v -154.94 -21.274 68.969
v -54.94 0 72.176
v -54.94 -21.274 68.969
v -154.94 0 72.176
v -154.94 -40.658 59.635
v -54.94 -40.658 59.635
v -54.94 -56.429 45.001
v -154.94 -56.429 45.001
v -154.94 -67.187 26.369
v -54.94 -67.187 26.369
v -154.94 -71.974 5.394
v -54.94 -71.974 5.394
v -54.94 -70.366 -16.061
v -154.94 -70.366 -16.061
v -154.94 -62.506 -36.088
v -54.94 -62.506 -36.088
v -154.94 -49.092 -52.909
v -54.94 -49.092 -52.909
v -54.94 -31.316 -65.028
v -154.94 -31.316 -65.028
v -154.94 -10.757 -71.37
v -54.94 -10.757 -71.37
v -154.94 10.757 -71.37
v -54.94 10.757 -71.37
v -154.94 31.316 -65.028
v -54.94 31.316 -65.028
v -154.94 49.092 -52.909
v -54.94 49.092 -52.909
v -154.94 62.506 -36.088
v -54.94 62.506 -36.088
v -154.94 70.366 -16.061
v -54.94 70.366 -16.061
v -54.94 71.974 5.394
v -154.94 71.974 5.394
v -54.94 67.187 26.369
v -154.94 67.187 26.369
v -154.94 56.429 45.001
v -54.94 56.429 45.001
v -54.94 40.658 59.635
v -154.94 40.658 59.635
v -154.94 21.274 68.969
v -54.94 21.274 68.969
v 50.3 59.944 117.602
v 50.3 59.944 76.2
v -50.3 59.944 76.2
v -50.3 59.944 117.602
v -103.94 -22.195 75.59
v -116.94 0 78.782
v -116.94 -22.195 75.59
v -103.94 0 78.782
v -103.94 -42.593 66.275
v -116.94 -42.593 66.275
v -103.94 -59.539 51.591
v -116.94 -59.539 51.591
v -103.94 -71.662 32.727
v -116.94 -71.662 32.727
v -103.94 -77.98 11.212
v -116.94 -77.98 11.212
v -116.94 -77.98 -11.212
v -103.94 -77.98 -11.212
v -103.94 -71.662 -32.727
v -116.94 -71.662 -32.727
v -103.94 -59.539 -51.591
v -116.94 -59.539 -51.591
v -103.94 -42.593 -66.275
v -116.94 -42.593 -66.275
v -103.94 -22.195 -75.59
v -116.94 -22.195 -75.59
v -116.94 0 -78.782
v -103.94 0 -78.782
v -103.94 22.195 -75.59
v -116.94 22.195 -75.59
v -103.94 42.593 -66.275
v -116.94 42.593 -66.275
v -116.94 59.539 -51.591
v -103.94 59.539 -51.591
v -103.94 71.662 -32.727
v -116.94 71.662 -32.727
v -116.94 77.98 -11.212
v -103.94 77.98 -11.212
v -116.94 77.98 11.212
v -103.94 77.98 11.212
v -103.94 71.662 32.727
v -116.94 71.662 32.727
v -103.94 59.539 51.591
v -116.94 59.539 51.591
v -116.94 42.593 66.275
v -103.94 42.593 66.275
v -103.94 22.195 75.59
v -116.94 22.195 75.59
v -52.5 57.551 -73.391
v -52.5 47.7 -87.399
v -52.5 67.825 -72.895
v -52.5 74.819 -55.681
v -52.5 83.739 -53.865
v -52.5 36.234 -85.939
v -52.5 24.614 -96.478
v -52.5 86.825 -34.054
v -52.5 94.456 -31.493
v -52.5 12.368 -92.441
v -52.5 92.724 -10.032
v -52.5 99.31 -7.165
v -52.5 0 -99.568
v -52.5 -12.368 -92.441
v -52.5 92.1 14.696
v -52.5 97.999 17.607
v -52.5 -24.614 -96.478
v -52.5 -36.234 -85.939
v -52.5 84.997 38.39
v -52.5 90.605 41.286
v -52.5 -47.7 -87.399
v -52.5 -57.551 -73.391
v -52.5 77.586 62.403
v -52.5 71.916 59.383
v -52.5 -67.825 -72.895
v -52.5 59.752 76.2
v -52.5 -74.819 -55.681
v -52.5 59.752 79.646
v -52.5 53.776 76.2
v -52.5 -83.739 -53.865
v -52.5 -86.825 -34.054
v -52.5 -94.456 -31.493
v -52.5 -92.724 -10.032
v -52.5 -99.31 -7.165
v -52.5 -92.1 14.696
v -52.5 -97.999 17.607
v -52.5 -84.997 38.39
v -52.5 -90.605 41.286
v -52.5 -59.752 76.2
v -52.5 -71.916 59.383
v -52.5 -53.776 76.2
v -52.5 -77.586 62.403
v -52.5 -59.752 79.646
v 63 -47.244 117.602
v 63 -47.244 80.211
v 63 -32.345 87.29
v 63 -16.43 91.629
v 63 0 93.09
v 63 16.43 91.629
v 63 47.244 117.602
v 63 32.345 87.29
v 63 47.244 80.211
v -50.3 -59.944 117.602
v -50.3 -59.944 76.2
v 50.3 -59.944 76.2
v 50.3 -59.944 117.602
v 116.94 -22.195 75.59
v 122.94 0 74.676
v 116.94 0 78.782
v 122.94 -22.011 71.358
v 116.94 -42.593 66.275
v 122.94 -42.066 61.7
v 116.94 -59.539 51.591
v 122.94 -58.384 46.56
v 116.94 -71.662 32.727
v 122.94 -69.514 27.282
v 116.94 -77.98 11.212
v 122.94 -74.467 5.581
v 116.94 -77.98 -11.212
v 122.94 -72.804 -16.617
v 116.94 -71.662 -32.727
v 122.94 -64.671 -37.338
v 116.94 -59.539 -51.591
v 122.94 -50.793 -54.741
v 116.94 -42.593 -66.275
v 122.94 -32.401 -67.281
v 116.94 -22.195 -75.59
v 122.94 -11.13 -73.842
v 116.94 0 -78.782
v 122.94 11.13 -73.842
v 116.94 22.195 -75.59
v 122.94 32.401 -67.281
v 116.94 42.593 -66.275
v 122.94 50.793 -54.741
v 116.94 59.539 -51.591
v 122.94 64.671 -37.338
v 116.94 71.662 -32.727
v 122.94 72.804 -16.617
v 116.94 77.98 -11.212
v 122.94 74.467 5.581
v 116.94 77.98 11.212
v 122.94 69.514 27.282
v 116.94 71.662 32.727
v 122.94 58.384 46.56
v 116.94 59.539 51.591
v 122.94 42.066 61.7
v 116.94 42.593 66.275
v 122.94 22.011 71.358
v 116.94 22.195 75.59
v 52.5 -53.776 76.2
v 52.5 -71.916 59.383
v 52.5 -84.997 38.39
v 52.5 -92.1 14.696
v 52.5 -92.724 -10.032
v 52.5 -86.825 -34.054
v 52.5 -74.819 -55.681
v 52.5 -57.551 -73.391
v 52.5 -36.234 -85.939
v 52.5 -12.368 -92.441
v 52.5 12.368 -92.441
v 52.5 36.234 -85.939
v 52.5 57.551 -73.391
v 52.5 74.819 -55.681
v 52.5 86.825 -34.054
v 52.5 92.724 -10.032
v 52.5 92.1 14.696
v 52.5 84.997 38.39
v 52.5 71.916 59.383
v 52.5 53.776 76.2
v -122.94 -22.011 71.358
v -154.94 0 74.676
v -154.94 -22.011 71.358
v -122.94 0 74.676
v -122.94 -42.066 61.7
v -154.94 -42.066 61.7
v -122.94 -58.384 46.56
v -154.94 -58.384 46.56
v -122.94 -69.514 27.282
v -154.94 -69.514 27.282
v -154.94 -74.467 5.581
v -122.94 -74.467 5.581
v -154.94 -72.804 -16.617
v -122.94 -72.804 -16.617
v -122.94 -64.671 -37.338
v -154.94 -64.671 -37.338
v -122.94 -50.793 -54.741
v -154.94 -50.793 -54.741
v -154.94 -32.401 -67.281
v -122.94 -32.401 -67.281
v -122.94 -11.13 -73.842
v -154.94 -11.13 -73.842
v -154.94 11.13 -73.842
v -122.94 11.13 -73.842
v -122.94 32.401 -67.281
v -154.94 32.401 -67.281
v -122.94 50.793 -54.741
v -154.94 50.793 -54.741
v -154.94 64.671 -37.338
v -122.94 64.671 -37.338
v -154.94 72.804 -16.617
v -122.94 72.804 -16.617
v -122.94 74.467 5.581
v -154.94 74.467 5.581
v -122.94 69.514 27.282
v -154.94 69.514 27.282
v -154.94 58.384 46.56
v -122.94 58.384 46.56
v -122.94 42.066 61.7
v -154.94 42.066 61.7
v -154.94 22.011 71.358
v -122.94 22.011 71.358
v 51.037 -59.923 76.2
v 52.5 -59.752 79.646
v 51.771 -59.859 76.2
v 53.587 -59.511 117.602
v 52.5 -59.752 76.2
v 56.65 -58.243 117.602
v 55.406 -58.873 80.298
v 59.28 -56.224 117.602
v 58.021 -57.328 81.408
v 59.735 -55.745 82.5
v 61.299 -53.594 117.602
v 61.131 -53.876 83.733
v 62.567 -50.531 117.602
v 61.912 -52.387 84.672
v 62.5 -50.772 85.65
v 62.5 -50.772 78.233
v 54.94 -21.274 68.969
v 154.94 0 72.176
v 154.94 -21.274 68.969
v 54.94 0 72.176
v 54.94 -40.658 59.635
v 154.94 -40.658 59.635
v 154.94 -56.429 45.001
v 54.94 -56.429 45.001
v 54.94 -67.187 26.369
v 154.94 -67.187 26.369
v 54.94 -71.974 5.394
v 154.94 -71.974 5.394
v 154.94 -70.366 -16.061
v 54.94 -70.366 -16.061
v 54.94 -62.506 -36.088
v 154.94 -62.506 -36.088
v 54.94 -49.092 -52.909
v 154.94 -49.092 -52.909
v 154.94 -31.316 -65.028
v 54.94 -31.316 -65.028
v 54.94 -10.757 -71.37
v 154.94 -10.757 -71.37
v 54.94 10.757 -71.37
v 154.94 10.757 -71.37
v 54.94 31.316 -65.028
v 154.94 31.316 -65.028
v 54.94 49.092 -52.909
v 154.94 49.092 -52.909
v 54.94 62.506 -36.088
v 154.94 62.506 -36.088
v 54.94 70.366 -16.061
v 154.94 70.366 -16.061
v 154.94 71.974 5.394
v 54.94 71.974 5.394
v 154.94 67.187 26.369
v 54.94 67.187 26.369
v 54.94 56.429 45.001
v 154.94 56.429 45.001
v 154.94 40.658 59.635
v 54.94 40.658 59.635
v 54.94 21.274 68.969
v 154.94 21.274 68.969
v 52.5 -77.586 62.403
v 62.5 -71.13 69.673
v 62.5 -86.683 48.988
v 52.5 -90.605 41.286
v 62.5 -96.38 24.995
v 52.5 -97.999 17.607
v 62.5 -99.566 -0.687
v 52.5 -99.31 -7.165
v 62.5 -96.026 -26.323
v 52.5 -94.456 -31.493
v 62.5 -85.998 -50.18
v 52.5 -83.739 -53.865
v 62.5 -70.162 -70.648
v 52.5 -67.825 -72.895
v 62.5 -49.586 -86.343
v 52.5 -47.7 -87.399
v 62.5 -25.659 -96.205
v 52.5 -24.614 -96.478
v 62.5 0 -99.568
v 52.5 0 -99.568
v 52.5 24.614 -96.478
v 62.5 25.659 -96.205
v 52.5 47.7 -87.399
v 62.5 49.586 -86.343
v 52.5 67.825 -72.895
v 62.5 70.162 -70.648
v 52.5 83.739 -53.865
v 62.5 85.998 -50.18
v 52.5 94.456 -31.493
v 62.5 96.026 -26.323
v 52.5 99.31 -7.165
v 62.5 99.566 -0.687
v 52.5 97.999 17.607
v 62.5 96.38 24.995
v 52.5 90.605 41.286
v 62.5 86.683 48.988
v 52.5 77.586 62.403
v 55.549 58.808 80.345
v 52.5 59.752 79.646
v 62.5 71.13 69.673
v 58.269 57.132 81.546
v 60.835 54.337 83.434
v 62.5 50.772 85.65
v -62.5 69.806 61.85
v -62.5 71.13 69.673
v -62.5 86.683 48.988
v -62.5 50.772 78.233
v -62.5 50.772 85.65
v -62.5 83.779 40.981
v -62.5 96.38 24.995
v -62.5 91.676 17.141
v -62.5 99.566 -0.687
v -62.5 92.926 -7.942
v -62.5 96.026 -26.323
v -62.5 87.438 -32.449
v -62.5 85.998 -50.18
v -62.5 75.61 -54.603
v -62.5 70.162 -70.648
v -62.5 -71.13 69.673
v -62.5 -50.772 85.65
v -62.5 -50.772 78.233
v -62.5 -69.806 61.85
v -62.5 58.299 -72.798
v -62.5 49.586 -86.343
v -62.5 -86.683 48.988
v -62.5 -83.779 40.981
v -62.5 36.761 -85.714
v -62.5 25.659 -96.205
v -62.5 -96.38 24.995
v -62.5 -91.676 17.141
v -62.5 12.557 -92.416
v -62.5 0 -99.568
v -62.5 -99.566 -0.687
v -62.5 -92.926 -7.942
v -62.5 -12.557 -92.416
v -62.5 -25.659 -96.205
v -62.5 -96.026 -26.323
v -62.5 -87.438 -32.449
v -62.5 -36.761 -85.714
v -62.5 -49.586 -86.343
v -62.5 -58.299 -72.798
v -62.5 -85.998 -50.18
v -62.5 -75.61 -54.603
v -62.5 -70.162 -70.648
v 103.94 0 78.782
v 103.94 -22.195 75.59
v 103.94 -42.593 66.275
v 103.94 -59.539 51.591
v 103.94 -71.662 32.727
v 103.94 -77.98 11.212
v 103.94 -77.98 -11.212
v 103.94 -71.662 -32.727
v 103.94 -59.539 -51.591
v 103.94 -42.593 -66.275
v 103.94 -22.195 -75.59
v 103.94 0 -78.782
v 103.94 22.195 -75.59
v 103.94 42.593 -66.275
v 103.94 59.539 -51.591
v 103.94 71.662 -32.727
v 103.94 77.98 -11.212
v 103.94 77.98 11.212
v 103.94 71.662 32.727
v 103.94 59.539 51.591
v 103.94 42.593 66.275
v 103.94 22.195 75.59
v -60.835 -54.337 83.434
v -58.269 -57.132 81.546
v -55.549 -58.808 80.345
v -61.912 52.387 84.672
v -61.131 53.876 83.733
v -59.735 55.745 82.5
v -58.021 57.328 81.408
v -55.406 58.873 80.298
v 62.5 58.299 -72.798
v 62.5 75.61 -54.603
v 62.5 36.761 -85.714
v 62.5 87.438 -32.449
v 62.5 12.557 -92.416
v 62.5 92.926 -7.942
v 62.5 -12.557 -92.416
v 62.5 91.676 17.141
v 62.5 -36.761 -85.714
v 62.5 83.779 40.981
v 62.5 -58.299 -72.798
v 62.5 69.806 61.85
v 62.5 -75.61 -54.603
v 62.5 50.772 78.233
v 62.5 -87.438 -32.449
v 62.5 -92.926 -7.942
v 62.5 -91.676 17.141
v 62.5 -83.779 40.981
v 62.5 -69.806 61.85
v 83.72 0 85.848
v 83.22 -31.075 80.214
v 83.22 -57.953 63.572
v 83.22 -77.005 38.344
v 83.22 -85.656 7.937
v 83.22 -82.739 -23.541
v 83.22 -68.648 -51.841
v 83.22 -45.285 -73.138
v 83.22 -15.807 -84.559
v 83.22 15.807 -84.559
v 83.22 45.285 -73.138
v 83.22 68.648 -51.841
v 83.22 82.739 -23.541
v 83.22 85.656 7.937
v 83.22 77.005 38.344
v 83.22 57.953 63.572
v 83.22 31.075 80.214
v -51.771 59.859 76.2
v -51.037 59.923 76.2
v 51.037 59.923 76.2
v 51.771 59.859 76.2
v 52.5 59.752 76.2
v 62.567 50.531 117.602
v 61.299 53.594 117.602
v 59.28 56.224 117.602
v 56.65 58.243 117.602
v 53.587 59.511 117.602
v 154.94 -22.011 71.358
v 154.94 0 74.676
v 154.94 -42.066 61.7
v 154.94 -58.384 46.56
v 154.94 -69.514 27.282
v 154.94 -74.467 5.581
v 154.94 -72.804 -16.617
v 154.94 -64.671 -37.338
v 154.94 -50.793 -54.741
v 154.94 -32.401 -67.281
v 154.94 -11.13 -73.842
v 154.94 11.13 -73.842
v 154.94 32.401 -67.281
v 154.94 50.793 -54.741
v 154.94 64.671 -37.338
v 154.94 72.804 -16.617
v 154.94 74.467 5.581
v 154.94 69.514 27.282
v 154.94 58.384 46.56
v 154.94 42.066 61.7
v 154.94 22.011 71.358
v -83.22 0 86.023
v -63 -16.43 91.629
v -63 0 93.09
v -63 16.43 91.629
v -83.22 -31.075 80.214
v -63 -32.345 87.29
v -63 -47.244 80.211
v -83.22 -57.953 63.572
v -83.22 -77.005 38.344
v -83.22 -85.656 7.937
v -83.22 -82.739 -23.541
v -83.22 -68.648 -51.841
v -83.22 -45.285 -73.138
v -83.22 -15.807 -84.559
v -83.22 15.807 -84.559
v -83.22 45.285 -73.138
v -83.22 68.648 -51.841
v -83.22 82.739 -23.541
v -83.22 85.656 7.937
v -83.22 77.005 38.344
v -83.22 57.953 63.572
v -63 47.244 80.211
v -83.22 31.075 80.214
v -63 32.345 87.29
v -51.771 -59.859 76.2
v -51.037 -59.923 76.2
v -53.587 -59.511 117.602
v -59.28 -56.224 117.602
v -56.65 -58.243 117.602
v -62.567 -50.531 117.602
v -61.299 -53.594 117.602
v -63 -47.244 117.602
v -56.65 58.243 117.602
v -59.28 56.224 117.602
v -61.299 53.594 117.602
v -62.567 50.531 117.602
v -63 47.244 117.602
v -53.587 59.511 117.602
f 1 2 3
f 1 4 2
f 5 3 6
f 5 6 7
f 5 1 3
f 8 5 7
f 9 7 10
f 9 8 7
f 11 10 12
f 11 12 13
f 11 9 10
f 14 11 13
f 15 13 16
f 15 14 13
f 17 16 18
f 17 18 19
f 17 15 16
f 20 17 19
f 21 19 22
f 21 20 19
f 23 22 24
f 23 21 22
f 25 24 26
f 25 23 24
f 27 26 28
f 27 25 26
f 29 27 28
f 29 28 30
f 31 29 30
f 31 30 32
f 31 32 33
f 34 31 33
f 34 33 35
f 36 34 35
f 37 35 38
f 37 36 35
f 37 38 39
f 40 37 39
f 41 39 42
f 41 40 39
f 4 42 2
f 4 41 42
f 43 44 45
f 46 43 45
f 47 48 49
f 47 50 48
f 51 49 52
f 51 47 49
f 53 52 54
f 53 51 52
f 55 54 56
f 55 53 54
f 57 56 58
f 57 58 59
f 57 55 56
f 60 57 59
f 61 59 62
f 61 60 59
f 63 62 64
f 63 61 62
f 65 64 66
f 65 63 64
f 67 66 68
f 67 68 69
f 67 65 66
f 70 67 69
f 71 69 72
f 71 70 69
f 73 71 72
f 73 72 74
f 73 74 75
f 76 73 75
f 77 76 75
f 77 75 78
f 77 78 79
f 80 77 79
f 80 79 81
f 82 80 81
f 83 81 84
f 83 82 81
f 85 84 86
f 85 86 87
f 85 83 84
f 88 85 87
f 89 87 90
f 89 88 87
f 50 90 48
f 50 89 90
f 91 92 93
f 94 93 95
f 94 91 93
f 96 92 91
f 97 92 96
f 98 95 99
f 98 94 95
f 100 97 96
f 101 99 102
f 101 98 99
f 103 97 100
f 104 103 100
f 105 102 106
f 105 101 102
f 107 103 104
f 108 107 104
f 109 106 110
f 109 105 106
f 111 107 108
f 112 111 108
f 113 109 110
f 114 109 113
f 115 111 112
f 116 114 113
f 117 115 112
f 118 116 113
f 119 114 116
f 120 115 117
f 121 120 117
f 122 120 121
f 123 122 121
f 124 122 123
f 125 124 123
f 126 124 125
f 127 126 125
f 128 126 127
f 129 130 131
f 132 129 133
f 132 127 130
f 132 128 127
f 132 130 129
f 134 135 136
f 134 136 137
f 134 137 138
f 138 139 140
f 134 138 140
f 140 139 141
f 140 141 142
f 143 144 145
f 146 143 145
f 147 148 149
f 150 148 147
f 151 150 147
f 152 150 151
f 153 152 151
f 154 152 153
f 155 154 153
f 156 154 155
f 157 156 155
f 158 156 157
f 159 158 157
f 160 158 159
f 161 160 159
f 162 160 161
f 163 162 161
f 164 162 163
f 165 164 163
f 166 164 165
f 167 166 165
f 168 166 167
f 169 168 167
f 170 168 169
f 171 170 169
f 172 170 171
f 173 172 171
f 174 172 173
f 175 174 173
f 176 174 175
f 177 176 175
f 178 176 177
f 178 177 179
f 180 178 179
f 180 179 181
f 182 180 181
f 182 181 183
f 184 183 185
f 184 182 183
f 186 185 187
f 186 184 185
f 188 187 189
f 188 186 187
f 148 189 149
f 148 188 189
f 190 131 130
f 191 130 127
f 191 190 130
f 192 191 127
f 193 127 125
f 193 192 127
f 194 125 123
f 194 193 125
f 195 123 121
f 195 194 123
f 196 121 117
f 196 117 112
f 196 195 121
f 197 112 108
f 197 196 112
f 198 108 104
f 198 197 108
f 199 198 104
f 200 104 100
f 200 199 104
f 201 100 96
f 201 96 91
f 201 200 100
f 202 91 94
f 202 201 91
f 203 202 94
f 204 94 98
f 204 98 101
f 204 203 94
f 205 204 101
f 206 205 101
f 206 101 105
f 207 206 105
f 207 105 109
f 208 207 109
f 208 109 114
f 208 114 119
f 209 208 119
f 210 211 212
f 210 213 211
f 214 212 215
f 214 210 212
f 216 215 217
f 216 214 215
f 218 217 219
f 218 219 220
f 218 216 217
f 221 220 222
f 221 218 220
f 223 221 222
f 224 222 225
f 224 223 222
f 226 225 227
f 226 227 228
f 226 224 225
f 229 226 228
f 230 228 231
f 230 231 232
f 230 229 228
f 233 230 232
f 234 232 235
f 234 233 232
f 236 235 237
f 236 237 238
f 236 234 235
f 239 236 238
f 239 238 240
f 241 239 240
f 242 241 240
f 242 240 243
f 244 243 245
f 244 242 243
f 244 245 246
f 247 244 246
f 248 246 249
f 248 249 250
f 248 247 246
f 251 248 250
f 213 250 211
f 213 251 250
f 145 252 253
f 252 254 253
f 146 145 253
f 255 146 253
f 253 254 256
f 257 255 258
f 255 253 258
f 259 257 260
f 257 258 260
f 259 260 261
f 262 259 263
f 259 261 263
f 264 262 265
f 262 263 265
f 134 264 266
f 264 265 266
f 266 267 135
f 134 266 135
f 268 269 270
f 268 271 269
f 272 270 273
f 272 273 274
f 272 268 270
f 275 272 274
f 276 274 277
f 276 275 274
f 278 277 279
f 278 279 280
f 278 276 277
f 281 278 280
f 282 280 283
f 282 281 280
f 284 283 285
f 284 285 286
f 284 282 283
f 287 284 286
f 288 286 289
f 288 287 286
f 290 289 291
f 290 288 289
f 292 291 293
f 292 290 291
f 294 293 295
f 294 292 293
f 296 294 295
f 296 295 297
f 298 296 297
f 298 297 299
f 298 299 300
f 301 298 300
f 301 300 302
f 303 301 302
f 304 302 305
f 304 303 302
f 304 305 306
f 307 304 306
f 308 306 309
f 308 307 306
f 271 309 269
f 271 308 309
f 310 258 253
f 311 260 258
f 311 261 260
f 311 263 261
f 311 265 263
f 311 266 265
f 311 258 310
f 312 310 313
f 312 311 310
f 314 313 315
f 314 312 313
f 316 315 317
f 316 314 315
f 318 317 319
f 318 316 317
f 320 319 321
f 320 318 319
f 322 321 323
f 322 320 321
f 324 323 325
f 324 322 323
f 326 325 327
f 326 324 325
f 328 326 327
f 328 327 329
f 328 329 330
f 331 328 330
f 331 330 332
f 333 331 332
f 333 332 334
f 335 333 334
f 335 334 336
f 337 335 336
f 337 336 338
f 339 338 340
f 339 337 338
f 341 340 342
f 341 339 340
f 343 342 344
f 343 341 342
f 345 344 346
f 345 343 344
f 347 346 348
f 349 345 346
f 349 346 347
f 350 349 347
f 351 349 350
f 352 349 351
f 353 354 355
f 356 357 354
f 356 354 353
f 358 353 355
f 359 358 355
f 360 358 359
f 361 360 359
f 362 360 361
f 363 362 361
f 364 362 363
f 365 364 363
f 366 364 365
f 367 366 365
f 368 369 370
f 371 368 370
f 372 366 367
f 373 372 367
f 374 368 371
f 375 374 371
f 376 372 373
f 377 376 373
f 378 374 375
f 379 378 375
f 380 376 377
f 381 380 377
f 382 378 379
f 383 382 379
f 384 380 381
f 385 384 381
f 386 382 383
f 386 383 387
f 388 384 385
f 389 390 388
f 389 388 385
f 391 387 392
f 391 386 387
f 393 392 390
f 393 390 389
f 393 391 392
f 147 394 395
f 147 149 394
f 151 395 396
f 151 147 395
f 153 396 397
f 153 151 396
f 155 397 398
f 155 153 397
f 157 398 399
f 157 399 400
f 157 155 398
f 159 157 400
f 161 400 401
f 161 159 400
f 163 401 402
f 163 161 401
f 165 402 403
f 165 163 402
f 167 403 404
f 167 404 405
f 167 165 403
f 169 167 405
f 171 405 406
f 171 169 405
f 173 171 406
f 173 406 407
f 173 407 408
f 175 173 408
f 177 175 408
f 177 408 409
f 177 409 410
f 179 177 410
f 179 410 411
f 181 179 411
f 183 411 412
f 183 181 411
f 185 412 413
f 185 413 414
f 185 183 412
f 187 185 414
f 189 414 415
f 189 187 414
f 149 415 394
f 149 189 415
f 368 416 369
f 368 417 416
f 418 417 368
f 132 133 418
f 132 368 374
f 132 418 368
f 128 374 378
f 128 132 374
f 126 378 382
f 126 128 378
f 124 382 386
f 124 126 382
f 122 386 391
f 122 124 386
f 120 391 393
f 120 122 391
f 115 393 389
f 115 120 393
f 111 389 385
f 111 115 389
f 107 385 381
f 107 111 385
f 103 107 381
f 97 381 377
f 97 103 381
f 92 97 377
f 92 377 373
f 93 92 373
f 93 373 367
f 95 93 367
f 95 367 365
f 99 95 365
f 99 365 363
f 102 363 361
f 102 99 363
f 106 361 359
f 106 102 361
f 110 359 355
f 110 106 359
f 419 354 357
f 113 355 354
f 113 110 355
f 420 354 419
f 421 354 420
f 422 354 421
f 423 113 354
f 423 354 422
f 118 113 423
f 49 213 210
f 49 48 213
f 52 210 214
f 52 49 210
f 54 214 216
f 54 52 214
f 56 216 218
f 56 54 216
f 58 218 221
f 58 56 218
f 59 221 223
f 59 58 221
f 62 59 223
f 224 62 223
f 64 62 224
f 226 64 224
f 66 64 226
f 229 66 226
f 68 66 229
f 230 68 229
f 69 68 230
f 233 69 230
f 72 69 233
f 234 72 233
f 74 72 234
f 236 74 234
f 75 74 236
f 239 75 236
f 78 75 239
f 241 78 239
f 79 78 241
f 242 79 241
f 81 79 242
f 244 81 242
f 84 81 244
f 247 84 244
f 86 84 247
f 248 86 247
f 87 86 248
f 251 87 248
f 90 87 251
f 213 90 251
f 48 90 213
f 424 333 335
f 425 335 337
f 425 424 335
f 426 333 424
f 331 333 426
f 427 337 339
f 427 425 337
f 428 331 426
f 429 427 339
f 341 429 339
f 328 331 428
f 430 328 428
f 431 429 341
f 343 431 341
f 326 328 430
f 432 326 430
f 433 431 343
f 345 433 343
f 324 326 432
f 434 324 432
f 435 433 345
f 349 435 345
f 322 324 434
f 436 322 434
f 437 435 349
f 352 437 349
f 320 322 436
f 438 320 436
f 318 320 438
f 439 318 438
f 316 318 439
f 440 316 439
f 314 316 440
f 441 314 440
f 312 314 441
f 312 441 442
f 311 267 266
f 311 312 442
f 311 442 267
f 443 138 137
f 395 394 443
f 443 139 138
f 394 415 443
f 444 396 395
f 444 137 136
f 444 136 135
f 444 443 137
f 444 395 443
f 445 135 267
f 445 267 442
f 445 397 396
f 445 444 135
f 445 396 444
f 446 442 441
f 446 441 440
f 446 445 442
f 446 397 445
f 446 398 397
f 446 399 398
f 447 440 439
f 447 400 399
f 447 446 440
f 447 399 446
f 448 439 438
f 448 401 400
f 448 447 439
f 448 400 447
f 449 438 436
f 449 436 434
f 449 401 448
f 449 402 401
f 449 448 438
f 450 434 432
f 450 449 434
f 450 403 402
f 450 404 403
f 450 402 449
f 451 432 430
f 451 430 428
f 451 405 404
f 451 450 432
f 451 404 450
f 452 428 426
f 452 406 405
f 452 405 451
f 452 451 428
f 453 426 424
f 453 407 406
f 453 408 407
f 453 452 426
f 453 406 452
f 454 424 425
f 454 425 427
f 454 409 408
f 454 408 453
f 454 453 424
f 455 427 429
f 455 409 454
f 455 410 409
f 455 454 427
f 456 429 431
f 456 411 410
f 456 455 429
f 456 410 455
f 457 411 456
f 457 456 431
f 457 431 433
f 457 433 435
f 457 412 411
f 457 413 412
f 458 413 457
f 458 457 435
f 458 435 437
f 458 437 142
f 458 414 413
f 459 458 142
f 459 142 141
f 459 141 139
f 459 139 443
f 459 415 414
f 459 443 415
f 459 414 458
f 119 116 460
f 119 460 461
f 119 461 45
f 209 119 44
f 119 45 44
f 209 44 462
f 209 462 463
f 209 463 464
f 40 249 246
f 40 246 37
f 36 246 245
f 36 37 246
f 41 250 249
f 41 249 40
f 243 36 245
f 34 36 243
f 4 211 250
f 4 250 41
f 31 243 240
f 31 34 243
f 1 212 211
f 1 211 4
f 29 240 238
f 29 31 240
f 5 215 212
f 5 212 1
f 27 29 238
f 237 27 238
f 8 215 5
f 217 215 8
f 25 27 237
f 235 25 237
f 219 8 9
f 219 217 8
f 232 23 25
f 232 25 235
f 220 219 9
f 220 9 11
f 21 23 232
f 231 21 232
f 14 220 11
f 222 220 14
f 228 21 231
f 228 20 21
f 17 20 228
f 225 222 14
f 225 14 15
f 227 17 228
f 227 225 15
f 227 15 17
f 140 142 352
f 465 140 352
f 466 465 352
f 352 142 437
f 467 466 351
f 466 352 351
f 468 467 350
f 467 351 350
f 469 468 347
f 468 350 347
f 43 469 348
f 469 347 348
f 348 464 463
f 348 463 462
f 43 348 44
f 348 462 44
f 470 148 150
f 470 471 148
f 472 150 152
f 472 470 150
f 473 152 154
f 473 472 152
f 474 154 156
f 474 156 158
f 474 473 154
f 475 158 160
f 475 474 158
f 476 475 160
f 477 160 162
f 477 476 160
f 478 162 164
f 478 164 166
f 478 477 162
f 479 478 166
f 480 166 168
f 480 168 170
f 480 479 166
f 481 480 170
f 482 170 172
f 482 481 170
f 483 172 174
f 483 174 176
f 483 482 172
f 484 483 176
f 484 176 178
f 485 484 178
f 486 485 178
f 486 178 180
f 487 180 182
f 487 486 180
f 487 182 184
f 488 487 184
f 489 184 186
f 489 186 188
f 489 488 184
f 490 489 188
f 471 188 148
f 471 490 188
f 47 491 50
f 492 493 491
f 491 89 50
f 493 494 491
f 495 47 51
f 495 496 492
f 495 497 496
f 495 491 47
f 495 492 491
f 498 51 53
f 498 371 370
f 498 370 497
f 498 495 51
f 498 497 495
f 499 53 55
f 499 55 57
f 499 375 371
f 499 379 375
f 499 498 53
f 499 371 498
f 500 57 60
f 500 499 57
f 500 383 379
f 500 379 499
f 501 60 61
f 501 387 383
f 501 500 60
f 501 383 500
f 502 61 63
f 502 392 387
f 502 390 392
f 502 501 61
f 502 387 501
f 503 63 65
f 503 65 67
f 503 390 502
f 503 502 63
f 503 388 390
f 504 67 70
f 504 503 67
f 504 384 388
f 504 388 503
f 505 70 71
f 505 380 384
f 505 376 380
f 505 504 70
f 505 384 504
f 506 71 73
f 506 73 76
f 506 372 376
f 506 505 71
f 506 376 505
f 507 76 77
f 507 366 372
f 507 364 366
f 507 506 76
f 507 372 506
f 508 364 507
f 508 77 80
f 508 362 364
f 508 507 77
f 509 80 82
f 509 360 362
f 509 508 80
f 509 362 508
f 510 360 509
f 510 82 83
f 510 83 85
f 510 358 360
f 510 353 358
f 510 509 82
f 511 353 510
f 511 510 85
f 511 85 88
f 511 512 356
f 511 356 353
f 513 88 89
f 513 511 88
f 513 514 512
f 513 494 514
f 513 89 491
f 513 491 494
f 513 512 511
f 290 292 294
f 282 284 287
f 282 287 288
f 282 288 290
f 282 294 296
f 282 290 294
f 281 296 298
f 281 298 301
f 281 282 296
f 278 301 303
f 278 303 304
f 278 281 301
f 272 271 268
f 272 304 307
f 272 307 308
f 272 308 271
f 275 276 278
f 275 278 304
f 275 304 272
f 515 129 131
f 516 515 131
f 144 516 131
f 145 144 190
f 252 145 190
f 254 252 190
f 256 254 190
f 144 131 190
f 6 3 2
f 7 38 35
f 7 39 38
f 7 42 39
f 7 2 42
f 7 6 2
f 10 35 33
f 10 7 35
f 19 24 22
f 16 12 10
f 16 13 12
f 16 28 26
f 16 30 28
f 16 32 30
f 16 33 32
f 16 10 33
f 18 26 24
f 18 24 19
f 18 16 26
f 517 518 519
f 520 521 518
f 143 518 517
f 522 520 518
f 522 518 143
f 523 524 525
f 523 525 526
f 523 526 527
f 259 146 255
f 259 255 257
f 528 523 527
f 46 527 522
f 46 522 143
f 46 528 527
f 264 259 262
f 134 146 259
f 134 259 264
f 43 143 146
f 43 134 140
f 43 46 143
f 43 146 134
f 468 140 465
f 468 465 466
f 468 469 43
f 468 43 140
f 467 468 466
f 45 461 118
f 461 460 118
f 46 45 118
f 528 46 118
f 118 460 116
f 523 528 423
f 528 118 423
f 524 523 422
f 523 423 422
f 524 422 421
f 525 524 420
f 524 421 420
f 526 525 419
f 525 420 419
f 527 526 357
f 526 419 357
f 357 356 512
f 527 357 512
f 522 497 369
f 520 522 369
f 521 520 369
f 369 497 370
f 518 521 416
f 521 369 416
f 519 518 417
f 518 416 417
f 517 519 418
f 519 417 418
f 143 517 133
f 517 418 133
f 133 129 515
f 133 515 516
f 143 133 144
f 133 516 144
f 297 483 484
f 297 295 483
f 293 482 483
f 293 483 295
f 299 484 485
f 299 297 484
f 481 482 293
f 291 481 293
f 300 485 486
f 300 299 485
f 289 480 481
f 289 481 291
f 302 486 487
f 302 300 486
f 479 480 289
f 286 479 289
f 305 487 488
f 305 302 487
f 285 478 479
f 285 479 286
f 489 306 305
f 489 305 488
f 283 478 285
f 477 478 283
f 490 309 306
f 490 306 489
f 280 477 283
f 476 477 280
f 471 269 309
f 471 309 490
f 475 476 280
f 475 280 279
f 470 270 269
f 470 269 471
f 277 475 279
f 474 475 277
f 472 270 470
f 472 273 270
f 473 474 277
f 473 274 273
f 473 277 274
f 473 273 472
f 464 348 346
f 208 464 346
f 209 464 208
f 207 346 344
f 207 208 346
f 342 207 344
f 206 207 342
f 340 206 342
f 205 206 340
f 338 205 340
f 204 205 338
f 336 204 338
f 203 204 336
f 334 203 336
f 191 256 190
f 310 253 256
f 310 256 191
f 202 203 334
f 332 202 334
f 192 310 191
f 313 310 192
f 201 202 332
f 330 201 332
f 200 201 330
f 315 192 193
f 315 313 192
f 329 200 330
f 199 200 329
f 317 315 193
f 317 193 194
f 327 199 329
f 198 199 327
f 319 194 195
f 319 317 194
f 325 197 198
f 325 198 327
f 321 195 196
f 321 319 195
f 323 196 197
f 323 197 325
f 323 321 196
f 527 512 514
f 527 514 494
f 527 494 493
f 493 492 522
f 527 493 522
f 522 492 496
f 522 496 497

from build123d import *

# Parameters (mm, degrees)
PAD_DEPTH = 41.402


with BuildPart() as part:
    # Sketch → Revolution (revolve)
    with BuildSketch(Plane.XZ):
        Polygon((-103.94, 78.781697), (-62.5, 93.264797), (-62.5, 99.568), (-52.5, 99.568), (-52.5, 93.264797), (52.5, 93.264797), (52.5, 99.568), (62.5, 99.568), (62.5, 93.264797), (103.94, 78.781697), (116.94, 78.781697), (122.94, 74.676), (154.94, 74.676), (154.94, 72.176), (54.94, 72.176), (54.94, 0), (-54.94, 0), (-54.94, 72.176), (-154.94, 72.176), (-154.94, 74.676), (-122.94, 74.676), (-116.94, 78.781697), align=None)
    revolve(axis=Axis((0, 0, 0), (1, 0, 0)))

    # Sketch001 → Pad (new body)
    with BuildSketch(Plane.XY.offset(76.2)):
        with BuildLine():
            Line((-50.3, -59.944), (50.3, -59.944))
            ThreePointArc((50.3, -59.944), (59.280256, -56.224256), (63, -47.244))
            Line((63, -47.244), (63, 47.244))
            ThreePointArc((63, 47.244), (59.280256, 56.224256), (50.3, 59.944))
            Line((50.3, 59.944), (-50.3, 59.944))
            ThreePointArc((-50.3, 59.944), (-59.280256, 56.224256), (-63, 47.244))
            Line((-63, 47.244), (-63, -47.244))
            ThreePointArc((-63, -47.244), (-59.280256, -56.224256), (-50.3, -59.944))
        make_face()
    extrude(amount=PAD_DEPTH)


solid = part.part
